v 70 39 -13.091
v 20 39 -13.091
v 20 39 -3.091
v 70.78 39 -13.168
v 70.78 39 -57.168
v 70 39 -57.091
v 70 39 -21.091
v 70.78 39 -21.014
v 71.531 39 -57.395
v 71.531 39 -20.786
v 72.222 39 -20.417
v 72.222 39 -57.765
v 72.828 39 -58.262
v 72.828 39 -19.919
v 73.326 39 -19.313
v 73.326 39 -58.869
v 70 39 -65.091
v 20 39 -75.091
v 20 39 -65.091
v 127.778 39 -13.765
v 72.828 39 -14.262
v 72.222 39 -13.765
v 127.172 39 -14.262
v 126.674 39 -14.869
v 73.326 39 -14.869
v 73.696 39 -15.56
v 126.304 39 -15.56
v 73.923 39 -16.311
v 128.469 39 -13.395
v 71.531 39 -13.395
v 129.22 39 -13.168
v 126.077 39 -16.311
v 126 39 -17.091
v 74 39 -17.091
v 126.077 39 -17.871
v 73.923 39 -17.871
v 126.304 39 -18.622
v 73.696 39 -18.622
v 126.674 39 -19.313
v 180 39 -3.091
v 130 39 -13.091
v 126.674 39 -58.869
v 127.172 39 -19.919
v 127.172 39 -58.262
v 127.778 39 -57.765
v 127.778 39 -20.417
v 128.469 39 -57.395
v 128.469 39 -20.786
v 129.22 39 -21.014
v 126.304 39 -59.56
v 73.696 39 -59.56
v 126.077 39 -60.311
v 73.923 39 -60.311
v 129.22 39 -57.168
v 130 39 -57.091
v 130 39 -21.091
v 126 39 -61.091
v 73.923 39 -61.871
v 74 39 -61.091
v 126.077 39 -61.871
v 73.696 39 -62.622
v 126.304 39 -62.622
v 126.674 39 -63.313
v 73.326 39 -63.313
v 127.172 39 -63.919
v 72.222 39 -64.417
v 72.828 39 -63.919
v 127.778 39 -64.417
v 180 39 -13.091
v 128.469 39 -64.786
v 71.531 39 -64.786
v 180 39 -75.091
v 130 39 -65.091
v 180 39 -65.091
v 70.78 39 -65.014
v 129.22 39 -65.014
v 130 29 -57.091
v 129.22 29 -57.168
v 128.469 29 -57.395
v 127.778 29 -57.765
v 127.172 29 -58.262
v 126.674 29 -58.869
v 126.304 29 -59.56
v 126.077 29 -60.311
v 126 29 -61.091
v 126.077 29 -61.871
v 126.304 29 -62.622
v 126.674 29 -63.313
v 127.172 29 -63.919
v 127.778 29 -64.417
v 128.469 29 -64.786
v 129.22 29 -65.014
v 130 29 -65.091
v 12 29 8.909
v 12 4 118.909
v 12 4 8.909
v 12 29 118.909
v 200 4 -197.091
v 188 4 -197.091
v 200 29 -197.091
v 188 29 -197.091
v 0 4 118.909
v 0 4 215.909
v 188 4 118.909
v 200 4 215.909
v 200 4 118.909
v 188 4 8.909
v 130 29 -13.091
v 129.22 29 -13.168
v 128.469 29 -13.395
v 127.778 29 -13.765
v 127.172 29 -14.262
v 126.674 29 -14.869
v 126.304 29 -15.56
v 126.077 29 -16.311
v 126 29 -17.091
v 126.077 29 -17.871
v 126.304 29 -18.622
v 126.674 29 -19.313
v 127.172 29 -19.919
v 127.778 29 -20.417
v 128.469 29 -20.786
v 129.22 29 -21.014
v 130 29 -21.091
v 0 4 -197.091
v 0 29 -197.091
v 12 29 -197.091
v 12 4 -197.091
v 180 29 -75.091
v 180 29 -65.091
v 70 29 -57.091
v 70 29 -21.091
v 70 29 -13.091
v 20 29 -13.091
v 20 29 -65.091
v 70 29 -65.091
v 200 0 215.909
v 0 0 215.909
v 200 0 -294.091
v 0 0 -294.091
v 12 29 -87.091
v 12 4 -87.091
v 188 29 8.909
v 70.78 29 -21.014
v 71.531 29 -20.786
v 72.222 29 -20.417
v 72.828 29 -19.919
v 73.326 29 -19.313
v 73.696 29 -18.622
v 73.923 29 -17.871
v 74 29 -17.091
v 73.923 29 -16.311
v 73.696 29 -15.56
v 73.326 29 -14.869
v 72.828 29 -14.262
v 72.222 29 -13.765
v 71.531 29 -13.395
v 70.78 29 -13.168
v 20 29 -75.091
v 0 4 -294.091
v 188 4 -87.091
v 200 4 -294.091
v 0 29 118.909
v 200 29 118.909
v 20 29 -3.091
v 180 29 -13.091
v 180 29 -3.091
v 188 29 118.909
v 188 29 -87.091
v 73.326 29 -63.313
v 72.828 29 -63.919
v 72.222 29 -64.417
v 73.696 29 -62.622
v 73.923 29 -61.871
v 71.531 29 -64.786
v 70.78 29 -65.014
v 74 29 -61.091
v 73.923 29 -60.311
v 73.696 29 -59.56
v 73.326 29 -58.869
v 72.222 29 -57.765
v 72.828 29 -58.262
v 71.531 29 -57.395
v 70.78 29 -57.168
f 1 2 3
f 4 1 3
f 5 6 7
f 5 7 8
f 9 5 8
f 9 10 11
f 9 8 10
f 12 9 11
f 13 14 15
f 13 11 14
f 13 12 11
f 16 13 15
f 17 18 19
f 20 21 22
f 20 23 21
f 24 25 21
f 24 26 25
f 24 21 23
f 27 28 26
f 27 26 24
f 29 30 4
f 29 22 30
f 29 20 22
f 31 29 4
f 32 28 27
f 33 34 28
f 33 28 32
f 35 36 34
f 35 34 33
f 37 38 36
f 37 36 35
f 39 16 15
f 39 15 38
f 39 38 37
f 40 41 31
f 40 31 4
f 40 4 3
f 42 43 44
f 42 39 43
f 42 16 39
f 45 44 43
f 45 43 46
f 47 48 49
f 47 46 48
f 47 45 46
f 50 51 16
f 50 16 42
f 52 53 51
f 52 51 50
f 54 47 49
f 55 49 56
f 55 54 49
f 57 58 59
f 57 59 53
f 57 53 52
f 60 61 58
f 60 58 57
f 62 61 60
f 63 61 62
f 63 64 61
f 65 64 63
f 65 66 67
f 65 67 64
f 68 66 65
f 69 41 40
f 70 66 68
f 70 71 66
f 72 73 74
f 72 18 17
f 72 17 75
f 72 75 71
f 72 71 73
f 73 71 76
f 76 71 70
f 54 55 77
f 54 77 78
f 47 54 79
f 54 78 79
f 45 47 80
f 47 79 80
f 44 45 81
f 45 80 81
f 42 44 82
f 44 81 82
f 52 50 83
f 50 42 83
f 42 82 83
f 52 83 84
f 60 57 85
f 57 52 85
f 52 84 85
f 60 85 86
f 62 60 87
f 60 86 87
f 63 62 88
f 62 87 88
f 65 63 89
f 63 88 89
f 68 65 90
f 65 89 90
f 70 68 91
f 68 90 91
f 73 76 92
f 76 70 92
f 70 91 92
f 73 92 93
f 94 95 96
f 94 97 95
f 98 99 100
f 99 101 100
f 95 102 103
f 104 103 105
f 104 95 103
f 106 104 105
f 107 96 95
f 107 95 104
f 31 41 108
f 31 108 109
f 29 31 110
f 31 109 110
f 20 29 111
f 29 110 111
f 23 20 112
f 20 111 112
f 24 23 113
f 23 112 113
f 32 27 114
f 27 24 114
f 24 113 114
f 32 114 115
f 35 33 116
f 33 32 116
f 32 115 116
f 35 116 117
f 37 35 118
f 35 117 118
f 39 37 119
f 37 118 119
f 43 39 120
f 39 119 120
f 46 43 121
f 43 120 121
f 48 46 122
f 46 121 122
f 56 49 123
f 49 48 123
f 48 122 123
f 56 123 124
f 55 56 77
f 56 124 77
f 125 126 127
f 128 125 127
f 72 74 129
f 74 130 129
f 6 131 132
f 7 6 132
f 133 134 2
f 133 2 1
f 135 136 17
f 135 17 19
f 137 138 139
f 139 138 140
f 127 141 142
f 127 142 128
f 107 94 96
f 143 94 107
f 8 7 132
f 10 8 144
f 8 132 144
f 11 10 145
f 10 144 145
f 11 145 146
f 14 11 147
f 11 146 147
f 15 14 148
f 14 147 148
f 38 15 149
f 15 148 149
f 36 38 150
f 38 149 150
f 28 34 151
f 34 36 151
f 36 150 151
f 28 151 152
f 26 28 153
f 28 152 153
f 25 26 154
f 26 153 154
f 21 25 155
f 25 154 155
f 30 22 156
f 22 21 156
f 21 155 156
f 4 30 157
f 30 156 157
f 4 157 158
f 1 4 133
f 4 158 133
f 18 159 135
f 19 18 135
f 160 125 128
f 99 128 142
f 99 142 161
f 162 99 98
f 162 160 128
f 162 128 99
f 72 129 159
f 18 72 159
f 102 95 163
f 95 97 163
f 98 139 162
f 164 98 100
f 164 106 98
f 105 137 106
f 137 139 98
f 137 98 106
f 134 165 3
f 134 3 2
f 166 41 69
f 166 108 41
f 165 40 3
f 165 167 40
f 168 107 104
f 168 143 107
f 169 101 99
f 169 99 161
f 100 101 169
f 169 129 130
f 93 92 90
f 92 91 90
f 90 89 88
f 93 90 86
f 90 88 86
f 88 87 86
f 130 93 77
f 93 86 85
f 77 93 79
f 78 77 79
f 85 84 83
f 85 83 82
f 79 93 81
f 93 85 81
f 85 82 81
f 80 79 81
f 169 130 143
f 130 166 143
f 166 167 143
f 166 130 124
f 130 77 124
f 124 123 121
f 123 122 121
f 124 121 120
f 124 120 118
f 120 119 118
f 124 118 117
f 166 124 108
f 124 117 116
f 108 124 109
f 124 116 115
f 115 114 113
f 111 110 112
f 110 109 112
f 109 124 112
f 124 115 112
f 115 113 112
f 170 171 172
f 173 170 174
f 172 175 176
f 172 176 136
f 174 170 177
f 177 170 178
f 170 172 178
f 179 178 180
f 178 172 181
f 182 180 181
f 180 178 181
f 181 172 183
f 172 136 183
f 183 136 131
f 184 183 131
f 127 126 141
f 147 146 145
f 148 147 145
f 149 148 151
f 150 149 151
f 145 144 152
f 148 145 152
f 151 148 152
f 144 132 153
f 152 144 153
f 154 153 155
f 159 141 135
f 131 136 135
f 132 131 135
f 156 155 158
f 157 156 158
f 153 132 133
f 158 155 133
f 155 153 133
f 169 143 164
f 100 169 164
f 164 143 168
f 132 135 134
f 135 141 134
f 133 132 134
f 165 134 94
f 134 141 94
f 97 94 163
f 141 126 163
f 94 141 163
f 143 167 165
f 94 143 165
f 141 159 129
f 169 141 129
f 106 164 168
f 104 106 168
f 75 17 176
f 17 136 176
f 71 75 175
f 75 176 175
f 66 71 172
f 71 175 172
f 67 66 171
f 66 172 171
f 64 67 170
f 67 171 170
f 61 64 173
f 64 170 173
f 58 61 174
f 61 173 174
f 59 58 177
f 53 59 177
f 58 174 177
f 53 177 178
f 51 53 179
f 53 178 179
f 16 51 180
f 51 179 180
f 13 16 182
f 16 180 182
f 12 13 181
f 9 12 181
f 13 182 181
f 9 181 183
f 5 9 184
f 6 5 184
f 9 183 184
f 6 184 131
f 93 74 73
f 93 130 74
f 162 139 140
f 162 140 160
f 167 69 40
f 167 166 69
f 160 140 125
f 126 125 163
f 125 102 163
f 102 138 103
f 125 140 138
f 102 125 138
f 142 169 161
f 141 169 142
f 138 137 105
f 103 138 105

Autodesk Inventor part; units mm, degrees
ref_plane "YZ Plane" through (0, 0, 0) normal (1, 0, 0) x (0, 1, 0)
ref_plane "XZ Plane" through (0, 0, 0) normal (0, 1, 0) x (-1, 0, 0)
ref_plane "XY Plane" through (0, 0, 0) normal (0, 0, 1) x (1, 0, 0)
sketch "Эскиз1" plane through (0, 0, 0) normal (1, 0, 0) x (0, 1, 0)
  line L0 (29, 218.9091) -> (0, 218.9091)
  line L1 (0, 218.9091) -> (0, -297.0909)
  line L2 (0, -297.0909) -> (29, -297.0909)
  line L3 (29, -297.0909) -> (29, 218.9091)
  point P0 (0, 0)
  dimension "d0" = 516
  dimension "d1" = 29
extrude "Выдавливание1" add sketch "Эскиз1" along normal blind 200
sketch "Эскиз2" plane through (0, 29, 218.9091) normal (0, 1, 0) x (1, 0, 0)
  line L0 (0, 516) -> (0, 0) projected
  line L1 (0, 0) -> (200, 0) projected
  line L2 (200, 516) -> (200, 0) projected
  line L3 (0, 516) -> (200, 516) projected
  line L4 (20, 232) -> (180, 232)
  line L5 (180, 232) -> (180, 284)
  line L6 (180, 284) -> (20, 284)
  line L7 (20, 284) -> (20, 232)
  line L8 (20, 232) -> (180, 232)
  line L9 (180, 232) -> (180, 222)
  line L10 (180, 222) -> (20, 222)
  line L11 (20, 222) -> (20, 232)
  line L12 (20, 284) -> (180, 284)
  line L13 (180, 284) -> (180, 294)
  line L14 (180, 294) -> (20, 294)
  line L15 (20, 294) -> (20, 284)
  line L16 (70, 232) -> (130, 232)
  line L17 (130, 232) -> (130, 284)
  line L18 (130, 284) -> (70, 284)
  line L19 (70, 284) -> (70, 232)
  circle A0 centre (70, 236) radius 4
  circle A1 centre (70, 280) radius 4
  circle A2 centre (130, 280) radius 4
  circle A3 centre (130, 236) radius 4
  point P0 (0, 218.9091)
  point P1 (130, 240)
  point P2 (130, 276)
  point P3 (70, 276)
  point P4 (70, 240)
  dimension "d4" = 52
  dimension "d5" = 20
  dimension "d6" = 20
  dimension "d7" = 232
  dimension "d8" = 232
  dimension "d9" = 10
  dimension "d10" = 10
  dimension "d11" = 50
  dimension "d12" = 50
extrude "Выдавливание2" add sketch "Эскиз2" along normal blind 10 contours L4 L9 L10 L11 | A0 L19 A1 L6 A2 L17 A3 L4 | L15 L14 L13 L6
sketch "Эскиз3" plane through (0, 29, 218.9091) normal (0, 1, 0) x (1, 0, 0)
  line L0 (180, 294) -> (180, 284) projected
  line L1 (180, 284) -> (130, 284) projected
  arc A0 (130, 284) -> (130, 276) centre (130, 280) ccw projected
  line L2 (130, 276) -> (130, 240) projected
  arc A1 (130, 240) -> (130, 232) centre (130, 236) ccw projected
  line L3 (130, 232) -> (180, 232) projected
  line L4 (180, 232) -> (180, 222) projected
  line L5 (180, 222) -> (20, 222) projected
  line L6 (20, 222) -> (20, 232) projected
  line L7 (20, 232) -> (70, 232) projected
  arc A2 (70, 232) -> (70, 240) centre (70, 236) ccw projected
  line L8 (70, 240) -> (70, 276) projected
  arc A3 (70, 276) -> (70, 284) centre (70, 280) ccw projected
  line L9 (70, 284) -> (20, 284) projected
  line L10 (20, 284) -> (20, 294) projected
  line L11 (20, 294) -> (180, 294) projected
  line L12 (0, 516) -> (0, 0) projected
  line L13 (0, 0) -> (200, 0) projected
  line L14 (200, 516) -> (200, 0) projected
  line L15 (0, 516) -> (200, 516) projected
  line L16 (12, 12) -> (12, 504)
  line L17 (12, 504) -> (188, 504)
  line L18 (188, 504) -> (188, 12)
  line L19 (188, 12) -> (12, 12)
  line L20 (8, 210) -> (192, 210)
  line L21 (192, 210) -> (192, 244)
  line L22 (192, 244) -> (142, 244)
  line L23 (142, 244) -> (142, 272)
  line L24 (142, 272) -> (192, 272)
  line L25 (192, 272) -> (192, 306)
  line L26 (192, 306) -> (8, 306)
  line L27 (8, 306) -> (8, 272)
  line L28 (8, 272) -> (58, 272)
  line L29 (58, 272) -> (58, 244)
  line L30 (58, 244) -> (8, 244)
  line L31 (8, 244) -> (8, 210)
  line L32 (-28, 416) -> (286, 416)
  line L33 (286, 416) -> (286, 100)
  line L34 (286, 100) -> (-28, 100)
  line L35 (-28, 100) -> (-28, 416)
  point P0 (0, 218.9091)
  point P1 (0, 416)
  point P2 (12, 416)
  point P3 (12, 306)
  point P4 (188, 306)
  point P5 (188, 416)
  point P6 (200, 416)
  point P7 (200, 100)
  point P8 (188, 100)
  point P9 (188, 210)
  point P10 (12, 210)
  point P11 (12, 100)
  point P12 (0, 100)
  dimension "d15" = 100
  dimension "d16" = 100
extrude "Выдавливание3" cut sketch "Эскиз3" against normal blind 25 contours L15 L14 L32 L18 L17 L16 L12 | L34 L16 L19 L18 L14 L13 L12 | L32 L18 L26 L16 | L16 L17 L18 L32 | L34 L18 L19 L16 | L16 L20 L18 L34
sketch "Эскиз4" plane through (200, 0, 0) normal (1, 0, 0) x (0, 0, -1)
  line L0 (-218.9091, 0) -> (-215.9091, 0)
  line L1 (-215.9091, 0) -> (-215.9091, 13.6393)
  line L2 (-215.9091, 13.6393) -> (-218.9091, 13.6393)
  line L3 (-218.9091, 13.6393) -> (-218.9091, 0)
  line L4 (297.0909, 0) -> (297.0909, 4) projected
  line L5 (297.0909, 0) -> (294.0909, 0)
  line L6 (294.0909, 0) -> (294.0909, 8)
  line L7 (294.0909, 8) -> (297.0909, 8)
  line L8 (297.0909, 8) -> (297.0909, 0)
  point P0 (0, 0)
  dimension "d19" = 3
  dimension "d20" = 3
extrude "Выдавливание4" cut sketch "Эскиз4" against normal blind 1000
properties part number "Niz_Plita" material "Алюминий 6061"
